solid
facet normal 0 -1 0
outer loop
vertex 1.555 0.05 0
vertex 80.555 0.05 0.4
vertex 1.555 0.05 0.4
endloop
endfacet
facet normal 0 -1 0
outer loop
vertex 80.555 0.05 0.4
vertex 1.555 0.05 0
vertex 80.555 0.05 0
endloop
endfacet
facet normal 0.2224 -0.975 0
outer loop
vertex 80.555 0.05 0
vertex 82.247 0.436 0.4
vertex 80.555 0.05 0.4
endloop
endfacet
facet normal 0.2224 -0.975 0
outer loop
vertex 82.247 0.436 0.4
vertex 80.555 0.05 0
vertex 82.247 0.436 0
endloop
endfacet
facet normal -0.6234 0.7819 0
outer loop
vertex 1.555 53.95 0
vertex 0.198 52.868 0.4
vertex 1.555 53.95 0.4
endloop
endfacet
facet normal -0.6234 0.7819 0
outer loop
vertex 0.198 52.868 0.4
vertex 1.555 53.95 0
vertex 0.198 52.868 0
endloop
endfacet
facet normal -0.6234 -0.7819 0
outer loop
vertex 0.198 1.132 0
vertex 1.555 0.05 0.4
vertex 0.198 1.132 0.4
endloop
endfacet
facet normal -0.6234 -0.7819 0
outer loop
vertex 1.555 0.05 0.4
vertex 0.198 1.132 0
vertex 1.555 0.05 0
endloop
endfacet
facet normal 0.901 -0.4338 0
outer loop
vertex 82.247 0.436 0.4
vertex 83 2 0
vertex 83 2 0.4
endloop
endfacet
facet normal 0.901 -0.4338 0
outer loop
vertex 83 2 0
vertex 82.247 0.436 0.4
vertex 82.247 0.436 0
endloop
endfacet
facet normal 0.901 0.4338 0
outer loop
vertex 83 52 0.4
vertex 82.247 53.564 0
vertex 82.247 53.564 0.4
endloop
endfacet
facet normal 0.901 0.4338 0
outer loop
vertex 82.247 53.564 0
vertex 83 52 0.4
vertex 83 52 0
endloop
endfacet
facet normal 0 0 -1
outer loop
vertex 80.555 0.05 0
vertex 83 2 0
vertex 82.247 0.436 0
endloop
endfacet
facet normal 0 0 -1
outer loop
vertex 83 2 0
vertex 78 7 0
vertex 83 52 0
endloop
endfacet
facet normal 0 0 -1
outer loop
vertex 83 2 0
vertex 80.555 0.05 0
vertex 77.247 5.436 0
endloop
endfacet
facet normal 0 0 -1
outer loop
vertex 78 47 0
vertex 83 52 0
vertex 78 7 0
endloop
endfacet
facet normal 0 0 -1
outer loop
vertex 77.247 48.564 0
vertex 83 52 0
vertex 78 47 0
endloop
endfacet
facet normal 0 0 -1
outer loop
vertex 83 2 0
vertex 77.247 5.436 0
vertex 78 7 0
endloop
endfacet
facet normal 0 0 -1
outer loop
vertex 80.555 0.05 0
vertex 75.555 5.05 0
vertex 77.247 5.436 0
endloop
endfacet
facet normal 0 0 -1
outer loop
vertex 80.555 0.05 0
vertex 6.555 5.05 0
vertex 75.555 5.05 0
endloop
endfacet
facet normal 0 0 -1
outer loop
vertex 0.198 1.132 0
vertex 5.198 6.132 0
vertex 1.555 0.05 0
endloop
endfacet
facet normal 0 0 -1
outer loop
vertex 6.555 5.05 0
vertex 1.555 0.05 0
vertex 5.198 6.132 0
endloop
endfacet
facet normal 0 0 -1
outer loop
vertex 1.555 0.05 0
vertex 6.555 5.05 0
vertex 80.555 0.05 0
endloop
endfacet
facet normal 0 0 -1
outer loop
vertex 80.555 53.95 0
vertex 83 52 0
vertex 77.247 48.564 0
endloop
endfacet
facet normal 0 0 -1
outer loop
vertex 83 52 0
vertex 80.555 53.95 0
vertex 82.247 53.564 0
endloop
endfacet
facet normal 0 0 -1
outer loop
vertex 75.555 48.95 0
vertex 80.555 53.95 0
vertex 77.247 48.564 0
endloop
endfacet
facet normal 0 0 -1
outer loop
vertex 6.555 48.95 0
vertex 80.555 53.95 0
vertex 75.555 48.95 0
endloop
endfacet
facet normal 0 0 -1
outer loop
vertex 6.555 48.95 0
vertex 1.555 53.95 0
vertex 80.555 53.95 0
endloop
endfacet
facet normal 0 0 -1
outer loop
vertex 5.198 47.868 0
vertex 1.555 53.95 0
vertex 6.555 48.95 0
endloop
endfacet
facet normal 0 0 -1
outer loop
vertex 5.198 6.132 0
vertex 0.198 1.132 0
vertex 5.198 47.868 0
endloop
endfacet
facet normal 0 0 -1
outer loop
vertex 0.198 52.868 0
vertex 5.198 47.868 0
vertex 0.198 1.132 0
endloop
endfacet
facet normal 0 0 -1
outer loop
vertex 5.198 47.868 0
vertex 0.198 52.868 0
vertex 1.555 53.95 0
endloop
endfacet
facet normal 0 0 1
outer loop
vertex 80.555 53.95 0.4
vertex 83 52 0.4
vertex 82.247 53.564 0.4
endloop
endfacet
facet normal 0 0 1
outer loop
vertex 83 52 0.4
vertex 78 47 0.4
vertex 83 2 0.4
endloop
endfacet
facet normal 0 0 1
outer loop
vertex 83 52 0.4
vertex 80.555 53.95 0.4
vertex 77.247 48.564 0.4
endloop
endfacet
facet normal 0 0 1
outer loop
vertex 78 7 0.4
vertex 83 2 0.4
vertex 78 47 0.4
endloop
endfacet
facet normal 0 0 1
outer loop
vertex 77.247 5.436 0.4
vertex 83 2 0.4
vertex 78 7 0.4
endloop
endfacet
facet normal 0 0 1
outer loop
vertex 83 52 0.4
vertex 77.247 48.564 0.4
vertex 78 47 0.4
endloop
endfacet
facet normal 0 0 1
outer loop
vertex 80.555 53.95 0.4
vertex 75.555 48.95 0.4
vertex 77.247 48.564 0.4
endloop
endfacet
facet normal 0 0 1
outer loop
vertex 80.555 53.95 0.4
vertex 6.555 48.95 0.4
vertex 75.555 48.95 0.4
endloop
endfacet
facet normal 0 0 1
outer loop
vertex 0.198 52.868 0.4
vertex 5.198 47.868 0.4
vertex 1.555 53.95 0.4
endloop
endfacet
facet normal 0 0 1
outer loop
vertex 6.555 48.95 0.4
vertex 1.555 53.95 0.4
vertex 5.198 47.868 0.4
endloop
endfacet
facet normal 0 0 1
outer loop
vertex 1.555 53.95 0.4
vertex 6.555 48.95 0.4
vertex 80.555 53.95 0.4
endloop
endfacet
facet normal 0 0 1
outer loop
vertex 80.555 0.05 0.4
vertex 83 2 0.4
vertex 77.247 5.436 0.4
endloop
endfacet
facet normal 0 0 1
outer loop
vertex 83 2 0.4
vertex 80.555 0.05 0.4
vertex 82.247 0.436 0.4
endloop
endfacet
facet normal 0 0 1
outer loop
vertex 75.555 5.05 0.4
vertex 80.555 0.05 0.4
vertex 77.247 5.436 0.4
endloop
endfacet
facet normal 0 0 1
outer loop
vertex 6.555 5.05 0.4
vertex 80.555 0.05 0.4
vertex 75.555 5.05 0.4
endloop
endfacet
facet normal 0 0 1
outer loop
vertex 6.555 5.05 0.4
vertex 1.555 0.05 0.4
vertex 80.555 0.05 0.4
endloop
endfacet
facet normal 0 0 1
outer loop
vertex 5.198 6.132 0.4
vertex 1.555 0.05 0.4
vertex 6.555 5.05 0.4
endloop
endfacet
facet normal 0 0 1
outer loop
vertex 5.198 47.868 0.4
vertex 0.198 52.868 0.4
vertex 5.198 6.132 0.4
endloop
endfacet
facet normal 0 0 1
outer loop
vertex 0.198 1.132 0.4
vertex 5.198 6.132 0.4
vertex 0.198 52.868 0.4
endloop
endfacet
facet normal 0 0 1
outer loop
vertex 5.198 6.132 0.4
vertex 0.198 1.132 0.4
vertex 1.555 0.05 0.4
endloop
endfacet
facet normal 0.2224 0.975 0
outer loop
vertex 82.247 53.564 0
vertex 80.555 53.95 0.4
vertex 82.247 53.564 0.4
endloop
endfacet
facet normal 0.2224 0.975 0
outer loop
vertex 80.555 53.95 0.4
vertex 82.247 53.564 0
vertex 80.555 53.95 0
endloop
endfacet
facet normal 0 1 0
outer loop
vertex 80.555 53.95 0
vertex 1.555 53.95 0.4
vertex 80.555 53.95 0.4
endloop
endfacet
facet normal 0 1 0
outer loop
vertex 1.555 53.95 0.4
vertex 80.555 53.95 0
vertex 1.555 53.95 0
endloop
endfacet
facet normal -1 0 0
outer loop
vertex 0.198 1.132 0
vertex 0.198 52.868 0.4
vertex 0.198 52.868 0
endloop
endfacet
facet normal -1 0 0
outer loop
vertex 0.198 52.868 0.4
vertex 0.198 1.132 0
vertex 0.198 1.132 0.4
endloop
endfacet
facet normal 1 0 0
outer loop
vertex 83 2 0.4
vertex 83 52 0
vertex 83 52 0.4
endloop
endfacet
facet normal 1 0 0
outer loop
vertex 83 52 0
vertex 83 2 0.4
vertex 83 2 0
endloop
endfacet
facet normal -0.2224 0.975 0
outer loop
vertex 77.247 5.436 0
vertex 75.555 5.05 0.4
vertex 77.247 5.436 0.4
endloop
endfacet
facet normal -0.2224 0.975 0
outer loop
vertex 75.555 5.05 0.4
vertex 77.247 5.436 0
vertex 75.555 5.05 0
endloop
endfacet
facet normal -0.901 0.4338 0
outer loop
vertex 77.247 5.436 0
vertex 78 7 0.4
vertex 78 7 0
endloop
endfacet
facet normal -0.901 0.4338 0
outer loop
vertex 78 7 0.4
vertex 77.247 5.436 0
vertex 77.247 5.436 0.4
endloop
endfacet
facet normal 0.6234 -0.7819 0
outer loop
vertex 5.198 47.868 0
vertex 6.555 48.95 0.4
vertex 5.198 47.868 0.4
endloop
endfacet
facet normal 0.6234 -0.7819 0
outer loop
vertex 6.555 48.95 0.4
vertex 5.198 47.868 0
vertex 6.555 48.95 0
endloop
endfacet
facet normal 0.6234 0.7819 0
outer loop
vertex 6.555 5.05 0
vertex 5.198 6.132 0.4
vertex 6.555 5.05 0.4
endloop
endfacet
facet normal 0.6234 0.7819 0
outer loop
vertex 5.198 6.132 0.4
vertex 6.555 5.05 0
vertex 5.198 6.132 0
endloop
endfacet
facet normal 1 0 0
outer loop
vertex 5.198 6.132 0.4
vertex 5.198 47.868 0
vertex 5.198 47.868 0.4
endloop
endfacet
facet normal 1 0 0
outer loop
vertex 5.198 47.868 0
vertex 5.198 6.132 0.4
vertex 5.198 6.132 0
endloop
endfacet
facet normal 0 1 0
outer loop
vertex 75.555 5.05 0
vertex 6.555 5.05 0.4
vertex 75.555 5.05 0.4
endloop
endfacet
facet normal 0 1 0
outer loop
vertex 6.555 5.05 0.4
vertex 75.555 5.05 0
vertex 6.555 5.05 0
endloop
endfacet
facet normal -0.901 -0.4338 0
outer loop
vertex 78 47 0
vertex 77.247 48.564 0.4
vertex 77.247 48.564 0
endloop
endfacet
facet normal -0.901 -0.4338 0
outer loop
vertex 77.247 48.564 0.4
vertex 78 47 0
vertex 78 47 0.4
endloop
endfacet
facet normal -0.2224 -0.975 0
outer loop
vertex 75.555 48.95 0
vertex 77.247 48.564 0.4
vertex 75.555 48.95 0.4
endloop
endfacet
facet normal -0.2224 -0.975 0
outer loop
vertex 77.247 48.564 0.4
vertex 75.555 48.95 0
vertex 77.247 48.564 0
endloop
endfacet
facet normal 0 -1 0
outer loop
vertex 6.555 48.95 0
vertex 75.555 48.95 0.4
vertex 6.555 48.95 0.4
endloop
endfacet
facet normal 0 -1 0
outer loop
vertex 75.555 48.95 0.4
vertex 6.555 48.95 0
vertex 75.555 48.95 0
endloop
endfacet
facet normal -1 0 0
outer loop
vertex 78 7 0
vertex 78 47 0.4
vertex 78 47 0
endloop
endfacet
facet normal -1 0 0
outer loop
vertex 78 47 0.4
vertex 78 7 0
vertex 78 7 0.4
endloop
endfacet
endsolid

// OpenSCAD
union() {
  difference(){
    translate([2, 2, 0]) minkowski()
    {
      cube([79, 50, 0.2]);
      cylinder(r=2,h=0.2);
    }
    translate([7, 7, 0]) minkowski()
    {
      cube([69, 40, 0.2]);
      cylinder(r=2,h=0.2);
    }
  }
  linear_extrude(file = "path_mesh_3.dxf", height = 0.2);
}
